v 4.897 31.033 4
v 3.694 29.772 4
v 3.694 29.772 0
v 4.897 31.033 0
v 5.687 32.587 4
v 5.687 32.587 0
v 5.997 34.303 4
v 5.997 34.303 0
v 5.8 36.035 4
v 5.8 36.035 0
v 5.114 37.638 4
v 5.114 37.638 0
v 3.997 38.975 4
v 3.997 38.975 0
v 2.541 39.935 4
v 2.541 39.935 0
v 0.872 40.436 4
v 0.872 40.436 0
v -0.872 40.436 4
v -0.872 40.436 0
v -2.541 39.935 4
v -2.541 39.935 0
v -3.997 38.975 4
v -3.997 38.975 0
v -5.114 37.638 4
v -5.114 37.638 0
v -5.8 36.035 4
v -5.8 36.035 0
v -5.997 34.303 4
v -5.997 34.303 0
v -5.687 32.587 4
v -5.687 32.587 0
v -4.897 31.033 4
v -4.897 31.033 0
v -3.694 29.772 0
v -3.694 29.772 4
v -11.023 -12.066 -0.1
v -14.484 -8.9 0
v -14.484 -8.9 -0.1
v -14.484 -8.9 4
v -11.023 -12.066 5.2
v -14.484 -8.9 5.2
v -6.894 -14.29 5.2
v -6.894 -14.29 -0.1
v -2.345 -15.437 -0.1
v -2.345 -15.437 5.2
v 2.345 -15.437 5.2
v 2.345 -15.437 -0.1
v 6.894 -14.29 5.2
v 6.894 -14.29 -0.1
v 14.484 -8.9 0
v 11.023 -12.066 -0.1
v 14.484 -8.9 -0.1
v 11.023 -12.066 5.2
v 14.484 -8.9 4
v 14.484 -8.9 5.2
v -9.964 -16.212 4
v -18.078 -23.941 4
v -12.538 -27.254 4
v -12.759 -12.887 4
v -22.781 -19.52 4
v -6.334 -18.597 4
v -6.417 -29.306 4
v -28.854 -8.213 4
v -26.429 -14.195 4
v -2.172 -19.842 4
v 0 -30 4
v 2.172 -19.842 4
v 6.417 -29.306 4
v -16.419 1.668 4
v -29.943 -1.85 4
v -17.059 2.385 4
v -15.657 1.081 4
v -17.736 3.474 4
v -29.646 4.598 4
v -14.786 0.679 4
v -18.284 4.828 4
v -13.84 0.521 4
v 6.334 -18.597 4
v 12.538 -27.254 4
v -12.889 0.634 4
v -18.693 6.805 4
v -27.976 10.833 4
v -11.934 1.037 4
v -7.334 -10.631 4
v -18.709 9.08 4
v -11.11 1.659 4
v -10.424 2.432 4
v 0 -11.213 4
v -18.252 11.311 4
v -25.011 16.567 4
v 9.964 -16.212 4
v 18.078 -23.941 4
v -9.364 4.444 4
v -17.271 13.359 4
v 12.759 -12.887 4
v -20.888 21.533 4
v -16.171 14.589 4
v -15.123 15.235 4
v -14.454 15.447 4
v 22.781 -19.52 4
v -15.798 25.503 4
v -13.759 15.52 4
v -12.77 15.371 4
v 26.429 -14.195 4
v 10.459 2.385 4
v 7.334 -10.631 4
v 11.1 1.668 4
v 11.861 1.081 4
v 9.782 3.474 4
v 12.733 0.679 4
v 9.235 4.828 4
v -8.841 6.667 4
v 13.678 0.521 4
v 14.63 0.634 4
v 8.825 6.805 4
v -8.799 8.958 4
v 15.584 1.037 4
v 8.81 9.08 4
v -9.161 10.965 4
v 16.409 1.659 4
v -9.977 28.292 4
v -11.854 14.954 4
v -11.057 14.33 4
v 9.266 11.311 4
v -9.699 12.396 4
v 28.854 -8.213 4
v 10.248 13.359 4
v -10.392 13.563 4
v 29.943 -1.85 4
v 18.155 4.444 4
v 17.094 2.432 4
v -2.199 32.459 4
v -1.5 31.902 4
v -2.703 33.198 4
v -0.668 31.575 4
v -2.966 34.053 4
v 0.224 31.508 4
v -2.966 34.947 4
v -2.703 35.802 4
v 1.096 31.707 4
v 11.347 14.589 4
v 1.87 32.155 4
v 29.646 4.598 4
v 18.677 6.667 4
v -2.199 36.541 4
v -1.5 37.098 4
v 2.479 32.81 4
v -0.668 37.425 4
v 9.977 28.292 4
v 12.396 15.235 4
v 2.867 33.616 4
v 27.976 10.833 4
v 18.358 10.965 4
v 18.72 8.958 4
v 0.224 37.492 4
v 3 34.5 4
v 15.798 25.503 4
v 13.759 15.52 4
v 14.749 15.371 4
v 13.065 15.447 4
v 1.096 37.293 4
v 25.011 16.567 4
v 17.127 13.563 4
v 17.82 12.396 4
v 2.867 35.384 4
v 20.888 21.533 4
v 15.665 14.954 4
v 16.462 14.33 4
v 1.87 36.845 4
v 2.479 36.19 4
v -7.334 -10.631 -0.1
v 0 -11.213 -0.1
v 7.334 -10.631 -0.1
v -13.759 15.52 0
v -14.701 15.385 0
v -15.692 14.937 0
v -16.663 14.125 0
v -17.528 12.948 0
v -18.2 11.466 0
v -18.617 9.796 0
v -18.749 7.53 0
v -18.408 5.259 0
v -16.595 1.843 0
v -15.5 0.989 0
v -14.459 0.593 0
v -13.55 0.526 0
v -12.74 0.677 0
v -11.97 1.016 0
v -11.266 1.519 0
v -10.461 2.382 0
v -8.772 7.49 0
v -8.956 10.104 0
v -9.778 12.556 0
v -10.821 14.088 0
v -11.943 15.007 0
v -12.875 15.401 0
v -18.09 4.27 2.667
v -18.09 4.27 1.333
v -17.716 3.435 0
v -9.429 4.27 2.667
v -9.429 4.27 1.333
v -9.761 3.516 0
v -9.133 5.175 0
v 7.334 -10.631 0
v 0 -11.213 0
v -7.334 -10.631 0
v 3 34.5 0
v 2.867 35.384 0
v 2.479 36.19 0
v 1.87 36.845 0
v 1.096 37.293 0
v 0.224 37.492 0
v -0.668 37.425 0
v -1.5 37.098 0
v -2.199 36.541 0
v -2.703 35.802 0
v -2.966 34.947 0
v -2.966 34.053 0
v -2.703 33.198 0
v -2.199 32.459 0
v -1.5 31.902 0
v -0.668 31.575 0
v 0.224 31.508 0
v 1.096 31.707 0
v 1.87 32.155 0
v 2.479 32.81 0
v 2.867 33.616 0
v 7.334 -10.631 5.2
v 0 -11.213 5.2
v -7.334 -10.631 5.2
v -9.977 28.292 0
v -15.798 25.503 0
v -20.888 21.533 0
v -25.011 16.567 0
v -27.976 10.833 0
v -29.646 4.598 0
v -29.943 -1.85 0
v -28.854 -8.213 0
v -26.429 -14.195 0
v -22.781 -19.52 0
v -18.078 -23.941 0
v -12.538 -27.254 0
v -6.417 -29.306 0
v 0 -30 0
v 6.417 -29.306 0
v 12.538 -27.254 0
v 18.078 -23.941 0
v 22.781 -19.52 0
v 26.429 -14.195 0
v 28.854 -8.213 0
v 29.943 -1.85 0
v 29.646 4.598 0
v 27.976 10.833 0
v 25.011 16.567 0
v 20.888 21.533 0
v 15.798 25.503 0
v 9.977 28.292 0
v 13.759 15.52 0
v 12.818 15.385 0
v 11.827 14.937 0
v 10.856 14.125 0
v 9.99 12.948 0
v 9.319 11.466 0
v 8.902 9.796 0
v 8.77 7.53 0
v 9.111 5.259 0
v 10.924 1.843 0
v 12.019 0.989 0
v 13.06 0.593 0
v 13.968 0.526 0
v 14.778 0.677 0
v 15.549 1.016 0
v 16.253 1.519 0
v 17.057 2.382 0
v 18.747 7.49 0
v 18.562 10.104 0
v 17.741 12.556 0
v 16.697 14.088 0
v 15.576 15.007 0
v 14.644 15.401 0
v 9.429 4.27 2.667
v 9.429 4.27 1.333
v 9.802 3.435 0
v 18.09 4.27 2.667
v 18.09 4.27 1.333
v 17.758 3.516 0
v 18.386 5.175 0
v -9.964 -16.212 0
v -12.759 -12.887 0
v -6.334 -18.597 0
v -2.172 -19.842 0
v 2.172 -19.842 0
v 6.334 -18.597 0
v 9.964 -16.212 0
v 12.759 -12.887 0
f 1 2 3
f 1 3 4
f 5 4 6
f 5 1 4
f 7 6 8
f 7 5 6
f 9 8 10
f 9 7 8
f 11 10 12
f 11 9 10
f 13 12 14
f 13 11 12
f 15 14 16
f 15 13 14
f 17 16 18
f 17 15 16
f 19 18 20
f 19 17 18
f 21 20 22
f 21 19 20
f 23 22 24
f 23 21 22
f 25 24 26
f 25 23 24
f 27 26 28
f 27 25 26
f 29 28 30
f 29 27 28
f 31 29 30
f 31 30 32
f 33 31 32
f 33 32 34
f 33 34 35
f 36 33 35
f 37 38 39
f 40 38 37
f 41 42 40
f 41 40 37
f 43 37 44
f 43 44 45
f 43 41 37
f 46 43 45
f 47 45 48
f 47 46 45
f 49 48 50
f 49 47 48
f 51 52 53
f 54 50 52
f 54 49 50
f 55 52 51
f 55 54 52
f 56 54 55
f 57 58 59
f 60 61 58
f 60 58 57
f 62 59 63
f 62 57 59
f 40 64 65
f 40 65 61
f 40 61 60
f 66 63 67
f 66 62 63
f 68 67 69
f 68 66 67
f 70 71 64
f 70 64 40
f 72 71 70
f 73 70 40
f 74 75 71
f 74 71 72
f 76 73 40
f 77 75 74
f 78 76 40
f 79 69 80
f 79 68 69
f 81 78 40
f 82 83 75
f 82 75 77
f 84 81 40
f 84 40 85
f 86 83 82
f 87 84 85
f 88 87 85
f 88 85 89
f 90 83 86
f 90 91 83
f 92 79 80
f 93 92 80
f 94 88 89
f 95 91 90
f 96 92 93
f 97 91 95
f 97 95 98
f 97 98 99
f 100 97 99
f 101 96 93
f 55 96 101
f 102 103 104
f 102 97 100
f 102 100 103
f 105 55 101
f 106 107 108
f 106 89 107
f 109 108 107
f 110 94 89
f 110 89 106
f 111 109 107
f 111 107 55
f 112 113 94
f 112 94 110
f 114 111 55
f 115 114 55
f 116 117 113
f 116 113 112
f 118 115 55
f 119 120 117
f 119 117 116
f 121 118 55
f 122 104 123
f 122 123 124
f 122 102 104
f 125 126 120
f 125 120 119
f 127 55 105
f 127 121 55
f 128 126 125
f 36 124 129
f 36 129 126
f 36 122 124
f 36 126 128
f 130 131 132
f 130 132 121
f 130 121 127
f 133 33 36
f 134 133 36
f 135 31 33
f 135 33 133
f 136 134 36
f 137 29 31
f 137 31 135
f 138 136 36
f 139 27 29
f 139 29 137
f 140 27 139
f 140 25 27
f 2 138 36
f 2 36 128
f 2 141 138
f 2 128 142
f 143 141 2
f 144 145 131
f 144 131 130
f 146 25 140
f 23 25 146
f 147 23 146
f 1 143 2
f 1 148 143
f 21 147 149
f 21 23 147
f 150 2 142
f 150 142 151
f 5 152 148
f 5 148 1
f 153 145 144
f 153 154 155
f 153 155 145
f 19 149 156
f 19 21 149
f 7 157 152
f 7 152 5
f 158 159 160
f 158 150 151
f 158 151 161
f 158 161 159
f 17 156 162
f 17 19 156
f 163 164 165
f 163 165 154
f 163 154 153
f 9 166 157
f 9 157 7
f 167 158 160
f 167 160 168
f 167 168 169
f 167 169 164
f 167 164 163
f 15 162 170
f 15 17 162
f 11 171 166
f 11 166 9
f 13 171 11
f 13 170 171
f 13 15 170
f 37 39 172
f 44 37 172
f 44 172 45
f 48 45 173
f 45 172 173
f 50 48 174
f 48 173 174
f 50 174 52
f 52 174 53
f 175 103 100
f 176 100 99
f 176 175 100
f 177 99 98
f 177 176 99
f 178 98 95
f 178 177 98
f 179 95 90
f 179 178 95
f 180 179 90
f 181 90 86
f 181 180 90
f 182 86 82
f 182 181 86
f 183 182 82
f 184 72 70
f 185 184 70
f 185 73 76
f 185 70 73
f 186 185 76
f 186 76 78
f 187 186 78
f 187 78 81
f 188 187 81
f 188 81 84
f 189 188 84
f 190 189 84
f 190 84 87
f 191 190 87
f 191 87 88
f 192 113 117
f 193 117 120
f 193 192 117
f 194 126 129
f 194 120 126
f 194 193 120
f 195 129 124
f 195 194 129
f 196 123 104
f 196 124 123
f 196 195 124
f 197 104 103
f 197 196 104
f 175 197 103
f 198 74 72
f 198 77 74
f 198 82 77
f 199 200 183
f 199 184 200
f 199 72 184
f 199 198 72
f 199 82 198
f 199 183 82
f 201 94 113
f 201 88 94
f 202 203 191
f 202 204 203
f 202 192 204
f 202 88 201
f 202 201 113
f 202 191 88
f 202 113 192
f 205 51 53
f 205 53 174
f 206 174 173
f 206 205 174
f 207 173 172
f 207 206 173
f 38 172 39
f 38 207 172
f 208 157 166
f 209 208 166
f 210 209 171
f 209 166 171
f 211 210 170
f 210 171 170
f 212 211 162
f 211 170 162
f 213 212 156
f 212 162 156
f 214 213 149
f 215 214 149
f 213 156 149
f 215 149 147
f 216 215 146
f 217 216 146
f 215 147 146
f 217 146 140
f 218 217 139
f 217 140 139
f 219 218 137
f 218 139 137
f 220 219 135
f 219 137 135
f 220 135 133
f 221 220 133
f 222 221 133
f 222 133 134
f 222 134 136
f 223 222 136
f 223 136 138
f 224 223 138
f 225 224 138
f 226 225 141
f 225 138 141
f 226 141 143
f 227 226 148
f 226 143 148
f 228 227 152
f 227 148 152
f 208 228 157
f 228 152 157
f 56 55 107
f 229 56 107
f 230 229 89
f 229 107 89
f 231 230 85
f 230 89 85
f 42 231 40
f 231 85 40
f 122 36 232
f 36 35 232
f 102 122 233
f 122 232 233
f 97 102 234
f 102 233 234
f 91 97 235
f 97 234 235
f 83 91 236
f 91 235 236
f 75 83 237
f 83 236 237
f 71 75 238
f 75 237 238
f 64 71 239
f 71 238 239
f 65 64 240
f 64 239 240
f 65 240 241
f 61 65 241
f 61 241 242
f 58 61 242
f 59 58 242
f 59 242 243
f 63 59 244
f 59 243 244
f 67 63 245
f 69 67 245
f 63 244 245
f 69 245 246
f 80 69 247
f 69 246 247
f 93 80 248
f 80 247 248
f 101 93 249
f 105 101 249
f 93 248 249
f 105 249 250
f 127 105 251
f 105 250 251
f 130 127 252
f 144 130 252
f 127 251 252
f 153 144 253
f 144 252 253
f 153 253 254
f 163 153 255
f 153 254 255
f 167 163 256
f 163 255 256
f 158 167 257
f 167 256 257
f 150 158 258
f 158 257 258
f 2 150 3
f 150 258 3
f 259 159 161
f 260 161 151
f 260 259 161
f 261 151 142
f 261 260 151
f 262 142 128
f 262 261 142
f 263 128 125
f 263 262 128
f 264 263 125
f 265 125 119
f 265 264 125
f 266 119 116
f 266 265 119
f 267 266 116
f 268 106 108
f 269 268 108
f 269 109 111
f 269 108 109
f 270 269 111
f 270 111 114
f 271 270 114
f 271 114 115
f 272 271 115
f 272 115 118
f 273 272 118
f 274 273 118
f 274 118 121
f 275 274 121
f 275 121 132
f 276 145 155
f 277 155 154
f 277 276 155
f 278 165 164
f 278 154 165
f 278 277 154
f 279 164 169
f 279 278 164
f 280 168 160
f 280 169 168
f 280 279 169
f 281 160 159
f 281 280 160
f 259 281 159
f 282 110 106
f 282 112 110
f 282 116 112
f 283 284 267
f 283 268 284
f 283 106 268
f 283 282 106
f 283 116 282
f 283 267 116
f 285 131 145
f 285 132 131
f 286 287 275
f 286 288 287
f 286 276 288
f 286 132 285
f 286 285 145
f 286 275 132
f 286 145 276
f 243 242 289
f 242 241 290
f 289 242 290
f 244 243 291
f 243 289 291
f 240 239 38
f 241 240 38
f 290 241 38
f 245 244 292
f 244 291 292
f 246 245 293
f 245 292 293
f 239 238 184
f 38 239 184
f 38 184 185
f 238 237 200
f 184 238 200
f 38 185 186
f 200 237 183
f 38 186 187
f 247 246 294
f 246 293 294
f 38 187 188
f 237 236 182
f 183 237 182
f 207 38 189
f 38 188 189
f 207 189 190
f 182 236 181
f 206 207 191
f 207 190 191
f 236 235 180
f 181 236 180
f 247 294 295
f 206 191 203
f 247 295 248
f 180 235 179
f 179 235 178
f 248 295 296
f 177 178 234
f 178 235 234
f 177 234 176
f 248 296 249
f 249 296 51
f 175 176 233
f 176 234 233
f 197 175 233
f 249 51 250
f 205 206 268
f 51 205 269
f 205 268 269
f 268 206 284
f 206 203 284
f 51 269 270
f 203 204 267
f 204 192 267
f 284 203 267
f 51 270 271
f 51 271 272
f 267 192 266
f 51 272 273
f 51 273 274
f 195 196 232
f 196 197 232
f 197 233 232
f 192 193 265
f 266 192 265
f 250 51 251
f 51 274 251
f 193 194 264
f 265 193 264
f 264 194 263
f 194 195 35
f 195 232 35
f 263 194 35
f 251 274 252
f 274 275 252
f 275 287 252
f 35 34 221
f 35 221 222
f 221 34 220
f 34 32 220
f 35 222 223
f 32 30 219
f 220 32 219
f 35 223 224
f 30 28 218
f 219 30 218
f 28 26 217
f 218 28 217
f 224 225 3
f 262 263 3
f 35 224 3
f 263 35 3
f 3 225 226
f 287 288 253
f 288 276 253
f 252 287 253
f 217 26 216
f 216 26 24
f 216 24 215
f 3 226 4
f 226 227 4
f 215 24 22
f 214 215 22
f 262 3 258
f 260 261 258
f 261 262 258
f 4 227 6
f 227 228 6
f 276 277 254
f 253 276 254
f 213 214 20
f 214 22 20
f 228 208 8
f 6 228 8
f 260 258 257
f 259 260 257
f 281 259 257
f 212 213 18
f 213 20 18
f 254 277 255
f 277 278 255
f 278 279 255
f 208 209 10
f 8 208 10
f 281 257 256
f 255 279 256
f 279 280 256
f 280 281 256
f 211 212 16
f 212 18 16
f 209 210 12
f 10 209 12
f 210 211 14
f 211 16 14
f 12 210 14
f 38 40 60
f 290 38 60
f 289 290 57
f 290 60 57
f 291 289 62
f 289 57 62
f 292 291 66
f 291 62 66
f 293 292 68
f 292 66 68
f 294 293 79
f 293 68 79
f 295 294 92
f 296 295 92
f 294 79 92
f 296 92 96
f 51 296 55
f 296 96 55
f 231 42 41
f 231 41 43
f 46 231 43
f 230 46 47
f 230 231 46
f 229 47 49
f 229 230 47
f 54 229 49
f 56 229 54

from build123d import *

# Parameters (mm, degrees)
F0_R          = 30
F1_DEPTH      = 4
F3_DEPTH      = 15.7
F5_DEPTH      = 14.1
F7_DEPTH      = 1.2
F7_DEPTH_BACK = 4.1
F8_R          = 6
F8_R_2        = 3
F9_DEPTH      = 4


# Not quite as in the source:
# - a feature names something its author has since deleted; it is built from what else it names


with BuildPart() as f1:
    # F0 (on Top) → F1 (new body)
    with BuildSketch(Plane.XY):
        Circle(F0_R)
        with BuildLine():
            ThreePointArc((18.5144313724, -15.5611746563), (-0.2600227829, -23.7984225598), (-18.8815741249, -15.2211148546))
            Line((-18.8815741249, -15.2211148546), (-16.6486222239, -13.9582220563))
            Line((-16.6486222239, -13.9582220563), (-14.4156703229, -12.695329258))
            ThreePointArc((-14.4156703229, -12.695329258), (-0.3525836389, -18.7968976895), (13.8984762541, -13.1482840248))
            Line((13.8984762541, -13.1482840248), (16.2064538132, -14.3547293405))
            Line((16.2064538132, -14.3547293405), (18.5144313724, -15.5611746563))
        make_face(mode=Mode.SUBTRACT)
        with BuildLine():
            add(Edge.make_bspline(
                [(-13.759398363, 15.5196315202), (-22.4196524008, 15.5196315202), (-18.0895253819, 4.2696315202), (-13.759398363, -6.9803684798), (-9.4292713441, 4.2696315202), (-5.0991443251, 15.5196315202), (-13.759398363, 15.5196315202)],
                knots=[0, 0, 0, 2.0943951024, 2.0943951024, 4.1887902048, 4.1887902048, 6.2831853072, 6.2831853072, 6.2831853072], degree=2, weights=[1, 0.5, 1, 0.5, 1, 0.5, 1]))
        make_face(mode=Mode.SUBTRACT)
        with BuildLine():
            add(Edge.make_bspline(
                [(13.759398363, 15.5196315202), (5.0991443251, 15.5196315202), (9.4292713441, 4.2696315202), (13.759398363, -6.9803684798), (18.0895253819, 4.2696315202), (22.4196524008, 15.5196315202), (13.759398363, 15.5196315202)],
                knots=[0, 0, 0, 2.0943951024, 2.0943951024, 4.1887902048, 4.1887902048, 6.2831853072, 6.2831853072, 6.2831853072], degree=2, weights=[1, 0.5, 1, 0.5, 1, 0.5, 1]))
        make_face(mode=Mode.SUBTRACT)
        with BuildLine():
            add(Edge.make_bspline(
                [(13.759398363, 15.5196315202), (5.0991443251, 15.5196315202), (9.4292713441, 4.2696315202), (13.759398363, -6.9803684798), (18.0895253819, 4.2696315202), (22.4196524008, 15.5196315202), (13.759398363, 15.5196315202)],
                knots=[0, 0, 0, 2.0943951024, 2.0943951024, 4.1887902048, 4.1887902048, 6.2831853072, 6.2831853072, 6.2831853072], degree=2, weights=[1, 0.5, 1, 0.5, 1, 0.5, 1]))
        make_face()
        with BuildLine():
            add(Edge.make_bspline(
                [(-13.759398363, 15.5196315202), (-22.4196524008, 15.5196315202), (-18.0895253819, 4.2696315202), (-13.759398363, -6.9803684798), (-9.4292713441, 4.2696315202), (-5.0991443251, 15.5196315202), (-13.759398363, 15.5196315202)],
                knots=[0, 0, 0, 2.0943951024, 2.0943951024, 4.1887902048, 4.1887902048, 6.2831853072, 6.2831853072, 6.2831853072], degree=2, weights=[1, 0.5, 1, 0.5, 1, 0.5, 1]))
        make_face()
        with BuildLine():
            Line((-14.4156703229, -12.695329258), (-16.6486222239, -13.9582220563))
            ThreePointArc((-16.6486222239, -13.9582220563), (-0.3057099111, -21.168664653), (16.2064538132, -14.3547293405))
            Line((16.2064538132, -14.3547293405), (13.8984762541, -13.1482840248))
            ThreePointArc((13.8984762541, -13.1482840248), (-0.3525836389, -18.7968976895), (-14.4156703229, -12.695329258))
        make_face()
        with BuildLine():
            Line((-16.6486222239, -13.9582220563), (-18.8815741249, -15.2211148546))
            ThreePointArc((-18.8815741249, -15.2211148546), (-0.2600227829, -23.7984225598), (18.5144313724, -15.5611746563))
            Line((18.5144313724, -15.5611746563), (16.2064538132, -14.3547293405))
            ThreePointArc((16.2064538132, -14.3547293405), (-0.3057099111, -21.168664653), (-16.6486222239, -13.9582220563))
        make_face()
    extrude(amount=F1_DEPTH)

    # F2 (on face) → F3 (cut)
    with BuildSketch(Plane.XY.offset(4)):
        with BuildLine():
            ThreePointArc((14.4841292455, -8.9), (0, -11.2132519808), (-14.4841292455, -8.9))
            ThreePointArc((-14.4841292455, -8.9), (0, -20), (14.4841292455, -8.9))
        make_face()
    extrude(amount=-F3_DEPTH, mode=Mode.SUBTRACT)

    # F0 (on Top) → F5 (cut)
    with BuildSketch(Plane.XY):
        with BuildLine():
            add(Edge.make_bspline(
                [(-13.759398363, 15.5196315202), (-22.4196524008, 15.5196315202), (-18.0895253819, 4.2696315202), (-13.759398363, -6.9803684798), (-9.4292713441, 4.2696315202), (-5.0991443251, 15.5196315202), (-13.759398363, 15.5196315202)],
                knots=[0, 0, 0, 2.0943951024, 2.0943951024, 4.1887902048, 4.1887902048, 6.2831853072, 6.2831853072, 6.2831853072], degree=2, weights=[1, 0.5, 1, 0.5, 1, 0.5, 1]))
        make_face()
        with BuildLine():
            add(Edge.make_bspline(
                [(13.759398363, 15.5196315202), (5.0991443251, 15.5196315202), (9.4292713441, 4.2696315202), (13.759398363, -6.9803684798), (18.0895253819, 4.2696315202), (22.4196524008, 15.5196315202), (13.759398363, 15.5196315202)],
                knots=[0, 0, 0, 2.0943951024, 2.0943951024, 4.1887902048, 4.1887902048, 6.2831853072, 6.2831853072, 6.2831853072], degree=2, weights=[1, 0.5, 1, 0.5, 1, 0.5, 1]))
        make_face()
    extrude(amount=F5_DEPTH, mode=Mode.SUBTRACT)

    # F6 (on face) → F7 (join, two sides)
    with BuildSketch(Plane.XY.offset(4)) as f7_sk:
        with BuildLine():
            ThreePointArc((14.4841292455, -8.9), (0, -11.2132519808), (-14.4841292455, -8.9))
            ThreePointArc((-14.4841292455, -8.9), (0, -15.581886089), (14.4841292455, -8.9))
        make_face()
    extrude(amount=F7_DEPTH)
    extrude(f7_sk.sketch, amount=-F7_DEPTH_BACK)

    # F8 (on face) → F9 (join)
    with BuildSketch(Plane.XY.offset(4)):
        with Locations((0, 34.5)):
            Circle(F8_R)
        with Locations((0, 34.5)):
            Circle(F8_R_2, mode=Mode.SUBTRACT)
    extrude(amount=-F9_DEPTH)


solid = f1.part
